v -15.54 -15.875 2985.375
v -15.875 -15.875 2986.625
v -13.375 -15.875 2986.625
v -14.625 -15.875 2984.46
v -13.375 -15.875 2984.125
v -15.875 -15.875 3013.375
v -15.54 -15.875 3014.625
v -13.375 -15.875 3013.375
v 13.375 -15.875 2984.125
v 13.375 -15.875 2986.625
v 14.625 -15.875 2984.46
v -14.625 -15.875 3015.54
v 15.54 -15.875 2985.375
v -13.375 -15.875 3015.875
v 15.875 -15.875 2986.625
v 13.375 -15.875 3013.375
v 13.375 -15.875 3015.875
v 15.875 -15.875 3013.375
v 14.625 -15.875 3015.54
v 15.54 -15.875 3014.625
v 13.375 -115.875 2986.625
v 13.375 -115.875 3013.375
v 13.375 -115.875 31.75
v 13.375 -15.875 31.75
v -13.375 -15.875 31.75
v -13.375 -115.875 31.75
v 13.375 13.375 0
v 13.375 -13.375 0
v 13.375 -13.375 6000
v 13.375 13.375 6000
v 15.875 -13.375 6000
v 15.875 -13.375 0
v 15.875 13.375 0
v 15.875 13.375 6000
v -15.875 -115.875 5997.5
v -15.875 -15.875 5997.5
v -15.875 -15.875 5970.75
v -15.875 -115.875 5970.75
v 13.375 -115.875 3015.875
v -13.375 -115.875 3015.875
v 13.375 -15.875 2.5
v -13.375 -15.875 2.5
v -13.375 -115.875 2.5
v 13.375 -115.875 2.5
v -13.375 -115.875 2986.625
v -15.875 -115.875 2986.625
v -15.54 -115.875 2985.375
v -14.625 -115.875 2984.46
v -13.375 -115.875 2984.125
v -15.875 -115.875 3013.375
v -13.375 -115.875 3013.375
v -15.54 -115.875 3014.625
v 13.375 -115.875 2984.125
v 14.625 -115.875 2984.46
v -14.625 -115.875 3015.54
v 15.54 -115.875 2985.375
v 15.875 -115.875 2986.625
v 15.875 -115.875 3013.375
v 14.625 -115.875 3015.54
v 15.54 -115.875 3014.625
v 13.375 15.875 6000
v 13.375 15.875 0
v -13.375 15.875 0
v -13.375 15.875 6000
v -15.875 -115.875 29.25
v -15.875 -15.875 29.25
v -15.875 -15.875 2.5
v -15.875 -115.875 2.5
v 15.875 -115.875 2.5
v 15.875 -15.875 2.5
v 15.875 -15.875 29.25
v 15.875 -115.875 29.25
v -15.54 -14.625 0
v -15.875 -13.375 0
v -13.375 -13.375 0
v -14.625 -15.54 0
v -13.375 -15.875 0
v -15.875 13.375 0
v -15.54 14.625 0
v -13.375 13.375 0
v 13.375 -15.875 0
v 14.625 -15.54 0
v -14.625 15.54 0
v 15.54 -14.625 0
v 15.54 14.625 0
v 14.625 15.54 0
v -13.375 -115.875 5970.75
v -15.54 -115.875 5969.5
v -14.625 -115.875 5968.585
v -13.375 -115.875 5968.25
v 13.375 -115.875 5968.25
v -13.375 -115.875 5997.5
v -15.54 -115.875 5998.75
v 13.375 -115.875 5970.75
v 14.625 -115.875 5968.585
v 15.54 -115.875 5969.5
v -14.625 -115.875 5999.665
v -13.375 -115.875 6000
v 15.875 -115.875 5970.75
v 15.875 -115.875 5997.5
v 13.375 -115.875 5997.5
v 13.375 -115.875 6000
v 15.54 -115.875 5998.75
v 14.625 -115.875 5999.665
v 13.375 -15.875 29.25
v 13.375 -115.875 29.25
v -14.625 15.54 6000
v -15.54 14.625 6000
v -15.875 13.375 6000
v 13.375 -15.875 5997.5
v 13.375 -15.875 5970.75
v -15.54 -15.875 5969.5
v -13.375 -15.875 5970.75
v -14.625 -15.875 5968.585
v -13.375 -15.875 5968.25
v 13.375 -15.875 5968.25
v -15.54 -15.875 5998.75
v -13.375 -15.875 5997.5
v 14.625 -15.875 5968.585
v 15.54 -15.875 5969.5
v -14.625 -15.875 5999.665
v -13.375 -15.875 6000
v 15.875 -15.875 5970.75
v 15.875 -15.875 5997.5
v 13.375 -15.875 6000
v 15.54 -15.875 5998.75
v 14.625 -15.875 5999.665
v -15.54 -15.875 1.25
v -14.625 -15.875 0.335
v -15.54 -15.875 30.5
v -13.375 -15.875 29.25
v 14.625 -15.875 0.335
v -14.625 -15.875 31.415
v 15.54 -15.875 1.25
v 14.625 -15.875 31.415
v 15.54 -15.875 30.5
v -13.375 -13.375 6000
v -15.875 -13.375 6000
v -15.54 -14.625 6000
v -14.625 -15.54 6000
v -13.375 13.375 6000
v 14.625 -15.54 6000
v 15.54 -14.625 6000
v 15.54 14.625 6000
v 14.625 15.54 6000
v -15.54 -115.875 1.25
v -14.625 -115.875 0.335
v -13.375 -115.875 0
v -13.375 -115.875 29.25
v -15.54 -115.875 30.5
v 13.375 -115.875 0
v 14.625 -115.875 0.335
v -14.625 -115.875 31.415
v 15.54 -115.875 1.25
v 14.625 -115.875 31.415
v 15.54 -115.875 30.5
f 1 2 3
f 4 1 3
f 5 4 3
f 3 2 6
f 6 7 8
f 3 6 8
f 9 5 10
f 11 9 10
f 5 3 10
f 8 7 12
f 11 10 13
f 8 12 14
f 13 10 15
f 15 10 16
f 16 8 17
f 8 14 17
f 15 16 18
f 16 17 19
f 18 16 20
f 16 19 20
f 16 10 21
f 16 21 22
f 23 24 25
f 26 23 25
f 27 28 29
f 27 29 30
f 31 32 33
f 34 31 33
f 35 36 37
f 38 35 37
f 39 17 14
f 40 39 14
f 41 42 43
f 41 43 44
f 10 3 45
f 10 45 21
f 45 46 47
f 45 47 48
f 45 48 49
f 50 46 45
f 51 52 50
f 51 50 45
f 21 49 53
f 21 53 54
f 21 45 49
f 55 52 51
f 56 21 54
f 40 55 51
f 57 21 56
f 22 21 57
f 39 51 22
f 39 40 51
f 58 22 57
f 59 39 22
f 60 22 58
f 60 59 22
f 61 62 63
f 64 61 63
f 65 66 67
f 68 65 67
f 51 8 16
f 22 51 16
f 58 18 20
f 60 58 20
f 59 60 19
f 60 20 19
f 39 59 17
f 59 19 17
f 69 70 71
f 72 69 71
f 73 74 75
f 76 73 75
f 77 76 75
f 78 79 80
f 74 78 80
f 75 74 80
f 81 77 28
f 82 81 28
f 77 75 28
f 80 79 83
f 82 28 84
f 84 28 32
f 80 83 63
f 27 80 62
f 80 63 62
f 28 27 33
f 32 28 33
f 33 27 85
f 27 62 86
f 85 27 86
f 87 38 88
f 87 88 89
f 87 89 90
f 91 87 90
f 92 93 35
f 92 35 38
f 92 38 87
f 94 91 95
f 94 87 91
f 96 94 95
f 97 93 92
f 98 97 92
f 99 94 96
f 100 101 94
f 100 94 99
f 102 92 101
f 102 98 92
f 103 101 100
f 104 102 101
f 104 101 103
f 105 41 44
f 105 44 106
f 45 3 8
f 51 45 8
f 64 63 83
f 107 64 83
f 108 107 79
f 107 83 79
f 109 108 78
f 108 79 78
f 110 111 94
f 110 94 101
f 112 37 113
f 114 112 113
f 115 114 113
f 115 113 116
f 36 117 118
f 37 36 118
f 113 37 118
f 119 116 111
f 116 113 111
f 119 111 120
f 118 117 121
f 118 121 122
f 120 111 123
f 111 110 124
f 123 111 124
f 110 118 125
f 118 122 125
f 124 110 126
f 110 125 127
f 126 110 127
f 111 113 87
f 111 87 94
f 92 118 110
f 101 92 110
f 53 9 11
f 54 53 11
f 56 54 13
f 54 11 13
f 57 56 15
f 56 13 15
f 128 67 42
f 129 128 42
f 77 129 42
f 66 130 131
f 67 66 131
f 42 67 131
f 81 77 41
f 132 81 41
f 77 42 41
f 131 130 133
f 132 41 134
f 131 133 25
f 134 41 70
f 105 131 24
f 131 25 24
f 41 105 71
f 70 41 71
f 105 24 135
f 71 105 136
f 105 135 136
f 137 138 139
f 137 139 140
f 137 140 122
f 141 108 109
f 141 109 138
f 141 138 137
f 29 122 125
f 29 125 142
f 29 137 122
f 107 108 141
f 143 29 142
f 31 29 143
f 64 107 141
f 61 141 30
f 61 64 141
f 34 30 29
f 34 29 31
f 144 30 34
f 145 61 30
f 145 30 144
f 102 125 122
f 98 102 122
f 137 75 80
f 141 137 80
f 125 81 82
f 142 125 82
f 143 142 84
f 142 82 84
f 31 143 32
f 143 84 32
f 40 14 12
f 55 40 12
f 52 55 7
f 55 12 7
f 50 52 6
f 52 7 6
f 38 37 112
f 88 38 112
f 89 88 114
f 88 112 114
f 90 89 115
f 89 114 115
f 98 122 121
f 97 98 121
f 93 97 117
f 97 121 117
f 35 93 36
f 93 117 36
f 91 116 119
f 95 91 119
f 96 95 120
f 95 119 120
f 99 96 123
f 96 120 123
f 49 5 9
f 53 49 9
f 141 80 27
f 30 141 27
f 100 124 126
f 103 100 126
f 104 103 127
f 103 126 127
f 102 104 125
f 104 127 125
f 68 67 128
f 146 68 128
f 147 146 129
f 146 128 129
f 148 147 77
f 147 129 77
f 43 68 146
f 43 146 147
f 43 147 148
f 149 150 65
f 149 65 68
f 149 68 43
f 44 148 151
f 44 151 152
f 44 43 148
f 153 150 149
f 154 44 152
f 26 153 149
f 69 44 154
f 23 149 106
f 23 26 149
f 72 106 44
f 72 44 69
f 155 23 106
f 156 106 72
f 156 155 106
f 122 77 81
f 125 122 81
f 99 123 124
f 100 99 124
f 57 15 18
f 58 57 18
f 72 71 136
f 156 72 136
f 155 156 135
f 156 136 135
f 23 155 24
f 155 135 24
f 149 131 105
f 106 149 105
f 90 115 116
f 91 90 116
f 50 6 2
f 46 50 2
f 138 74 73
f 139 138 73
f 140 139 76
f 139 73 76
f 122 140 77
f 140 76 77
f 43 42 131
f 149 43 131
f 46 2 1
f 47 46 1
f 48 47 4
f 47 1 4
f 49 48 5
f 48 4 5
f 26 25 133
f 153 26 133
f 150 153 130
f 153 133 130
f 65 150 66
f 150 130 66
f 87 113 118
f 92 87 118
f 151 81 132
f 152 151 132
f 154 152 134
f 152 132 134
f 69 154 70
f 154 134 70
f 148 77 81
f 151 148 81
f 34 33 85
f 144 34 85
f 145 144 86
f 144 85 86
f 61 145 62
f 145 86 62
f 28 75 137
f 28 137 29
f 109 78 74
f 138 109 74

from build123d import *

# Parameters (mm, degrees)
F0_W     = 26.75
F0_H     = 26.75
F1_DEPTH = 6000
F2_W     = 26.75
F2_H     = 26.75
F3_DEPTH = 100


with BuildPart() as f1:
    # F0 (on Top) → F1 (new body)
    with BuildSketch(Plane.XY):
        with BuildLine():
            ThreePointArc((15.875, 13.375), (15.142767, 15.142767), (13.375, 15.875))
            Line((13.375, 15.875), (-13.375, 15.875))
            ThreePointArc((-13.375, 15.875), (-15.142767, 15.142767), (-15.875, 13.375))
            Line((-15.875, 13.375), (-15.875, -13.375))
            ThreePointArc((-15.875, -13.375), (-15.142767, -15.142767), (-13.375, -15.875))
            Line((-13.375, -15.875), (13.375, -15.875))
            ThreePointArc((13.375, -15.875), (15.142767, -15.142767), (15.875, -13.375))
            Line((15.875, -13.375), (15.875, 13.375))
        make_face()
        Rectangle(F0_W, F0_H, mode=Mode.SUBTRACT)
    extrude(amount=F1_DEPTH)


with BuildPart() as f3:
    # F2 (on face) → F3 (new body)
    with BuildSketch(Plane.XZ.offset(15.875)):
        with BuildLine():
            Line((-13.375, 2984.125), (13.375, 2984.125))
            ThreePointArc((13.375, 2984.125), (15.142767, 2984.857233), (15.875, 2986.625))
            Line((15.875, 2986.625), (15.875, 3013.375))
            ThreePointArc((15.875, 3013.375), (15.142767, 3015.142767), (13.375, 3015.875))
            Line((13.375, 3015.875), (-13.375, 3015.875))
            ThreePointArc((-13.375, 3015.875), (-15.142767, 3015.142767), (-15.875, 3013.375))
            Line((-15.875, 3013.375), (-15.875, 2986.625))
            ThreePointArc((-15.875, 2986.625), (-15.142767, 2984.857233), (-13.375, 2984.125))
        make_face()
        with Locations((0, 3000)):
            Rectangle(F2_W, F2_H, mode=Mode.SUBTRACT)
        with BuildLine():
            Line((-13.375, 5968.25), (13.375, 5968.25))
            ThreePointArc((13.375, 5968.25), (15.142767, 5968.982233), (15.875, 5970.75))
            Line((15.875, 5970.75), (15.875, 5997.5))
            ThreePointArc((15.875, 5997.5), (15.142767, 5999.267767), (13.375, 6000))
            Line((13.375, 6000), (-13.375, 6000))
            ThreePointArc((-13.375, 6000), (-15.142767, 5999.267767), (-15.875, 5997.5))
            Line((-15.875, 5997.5), (-15.875, 5970.75))
            ThreePointArc((-15.875, 5970.75), (-15.142767, 5968.982233), (-13.375, 5968.25))
        make_face()
        with Locations((0, 5984.125)):
            Rectangle(F2_W, F2_H, mode=Mode.SUBTRACT)
        with BuildLine():
            Line((-13.375, 0), (13.375, 0))
            ThreePointArc((13.375, 0), (15.142767, 0.732233), (15.875, 2.5))
            Line((15.875, 2.5), (15.875, 29.25))
            ThreePointArc((15.875, 29.25), (15.142767, 31.017767), (13.375, 31.75))
            Line((13.375, 31.75), (-13.375, 31.75))
            ThreePointArc((-13.375, 31.75), (-15.142767, 31.017767), (-15.875, 29.25))
            Line((-15.875, 29.25), (-15.875, 2.5))
            ThreePointArc((-15.875, 2.5), (-15.142767, 0.732233), (-13.375, 0))
        make_face()
        with Locations((0, 15.875)):
            Rectangle(F2_W, F2_H, mode=Mode.SUBTRACT)
    extrude(amount=F3_DEPTH)


solid = Compound([f1.part, f3.part])
